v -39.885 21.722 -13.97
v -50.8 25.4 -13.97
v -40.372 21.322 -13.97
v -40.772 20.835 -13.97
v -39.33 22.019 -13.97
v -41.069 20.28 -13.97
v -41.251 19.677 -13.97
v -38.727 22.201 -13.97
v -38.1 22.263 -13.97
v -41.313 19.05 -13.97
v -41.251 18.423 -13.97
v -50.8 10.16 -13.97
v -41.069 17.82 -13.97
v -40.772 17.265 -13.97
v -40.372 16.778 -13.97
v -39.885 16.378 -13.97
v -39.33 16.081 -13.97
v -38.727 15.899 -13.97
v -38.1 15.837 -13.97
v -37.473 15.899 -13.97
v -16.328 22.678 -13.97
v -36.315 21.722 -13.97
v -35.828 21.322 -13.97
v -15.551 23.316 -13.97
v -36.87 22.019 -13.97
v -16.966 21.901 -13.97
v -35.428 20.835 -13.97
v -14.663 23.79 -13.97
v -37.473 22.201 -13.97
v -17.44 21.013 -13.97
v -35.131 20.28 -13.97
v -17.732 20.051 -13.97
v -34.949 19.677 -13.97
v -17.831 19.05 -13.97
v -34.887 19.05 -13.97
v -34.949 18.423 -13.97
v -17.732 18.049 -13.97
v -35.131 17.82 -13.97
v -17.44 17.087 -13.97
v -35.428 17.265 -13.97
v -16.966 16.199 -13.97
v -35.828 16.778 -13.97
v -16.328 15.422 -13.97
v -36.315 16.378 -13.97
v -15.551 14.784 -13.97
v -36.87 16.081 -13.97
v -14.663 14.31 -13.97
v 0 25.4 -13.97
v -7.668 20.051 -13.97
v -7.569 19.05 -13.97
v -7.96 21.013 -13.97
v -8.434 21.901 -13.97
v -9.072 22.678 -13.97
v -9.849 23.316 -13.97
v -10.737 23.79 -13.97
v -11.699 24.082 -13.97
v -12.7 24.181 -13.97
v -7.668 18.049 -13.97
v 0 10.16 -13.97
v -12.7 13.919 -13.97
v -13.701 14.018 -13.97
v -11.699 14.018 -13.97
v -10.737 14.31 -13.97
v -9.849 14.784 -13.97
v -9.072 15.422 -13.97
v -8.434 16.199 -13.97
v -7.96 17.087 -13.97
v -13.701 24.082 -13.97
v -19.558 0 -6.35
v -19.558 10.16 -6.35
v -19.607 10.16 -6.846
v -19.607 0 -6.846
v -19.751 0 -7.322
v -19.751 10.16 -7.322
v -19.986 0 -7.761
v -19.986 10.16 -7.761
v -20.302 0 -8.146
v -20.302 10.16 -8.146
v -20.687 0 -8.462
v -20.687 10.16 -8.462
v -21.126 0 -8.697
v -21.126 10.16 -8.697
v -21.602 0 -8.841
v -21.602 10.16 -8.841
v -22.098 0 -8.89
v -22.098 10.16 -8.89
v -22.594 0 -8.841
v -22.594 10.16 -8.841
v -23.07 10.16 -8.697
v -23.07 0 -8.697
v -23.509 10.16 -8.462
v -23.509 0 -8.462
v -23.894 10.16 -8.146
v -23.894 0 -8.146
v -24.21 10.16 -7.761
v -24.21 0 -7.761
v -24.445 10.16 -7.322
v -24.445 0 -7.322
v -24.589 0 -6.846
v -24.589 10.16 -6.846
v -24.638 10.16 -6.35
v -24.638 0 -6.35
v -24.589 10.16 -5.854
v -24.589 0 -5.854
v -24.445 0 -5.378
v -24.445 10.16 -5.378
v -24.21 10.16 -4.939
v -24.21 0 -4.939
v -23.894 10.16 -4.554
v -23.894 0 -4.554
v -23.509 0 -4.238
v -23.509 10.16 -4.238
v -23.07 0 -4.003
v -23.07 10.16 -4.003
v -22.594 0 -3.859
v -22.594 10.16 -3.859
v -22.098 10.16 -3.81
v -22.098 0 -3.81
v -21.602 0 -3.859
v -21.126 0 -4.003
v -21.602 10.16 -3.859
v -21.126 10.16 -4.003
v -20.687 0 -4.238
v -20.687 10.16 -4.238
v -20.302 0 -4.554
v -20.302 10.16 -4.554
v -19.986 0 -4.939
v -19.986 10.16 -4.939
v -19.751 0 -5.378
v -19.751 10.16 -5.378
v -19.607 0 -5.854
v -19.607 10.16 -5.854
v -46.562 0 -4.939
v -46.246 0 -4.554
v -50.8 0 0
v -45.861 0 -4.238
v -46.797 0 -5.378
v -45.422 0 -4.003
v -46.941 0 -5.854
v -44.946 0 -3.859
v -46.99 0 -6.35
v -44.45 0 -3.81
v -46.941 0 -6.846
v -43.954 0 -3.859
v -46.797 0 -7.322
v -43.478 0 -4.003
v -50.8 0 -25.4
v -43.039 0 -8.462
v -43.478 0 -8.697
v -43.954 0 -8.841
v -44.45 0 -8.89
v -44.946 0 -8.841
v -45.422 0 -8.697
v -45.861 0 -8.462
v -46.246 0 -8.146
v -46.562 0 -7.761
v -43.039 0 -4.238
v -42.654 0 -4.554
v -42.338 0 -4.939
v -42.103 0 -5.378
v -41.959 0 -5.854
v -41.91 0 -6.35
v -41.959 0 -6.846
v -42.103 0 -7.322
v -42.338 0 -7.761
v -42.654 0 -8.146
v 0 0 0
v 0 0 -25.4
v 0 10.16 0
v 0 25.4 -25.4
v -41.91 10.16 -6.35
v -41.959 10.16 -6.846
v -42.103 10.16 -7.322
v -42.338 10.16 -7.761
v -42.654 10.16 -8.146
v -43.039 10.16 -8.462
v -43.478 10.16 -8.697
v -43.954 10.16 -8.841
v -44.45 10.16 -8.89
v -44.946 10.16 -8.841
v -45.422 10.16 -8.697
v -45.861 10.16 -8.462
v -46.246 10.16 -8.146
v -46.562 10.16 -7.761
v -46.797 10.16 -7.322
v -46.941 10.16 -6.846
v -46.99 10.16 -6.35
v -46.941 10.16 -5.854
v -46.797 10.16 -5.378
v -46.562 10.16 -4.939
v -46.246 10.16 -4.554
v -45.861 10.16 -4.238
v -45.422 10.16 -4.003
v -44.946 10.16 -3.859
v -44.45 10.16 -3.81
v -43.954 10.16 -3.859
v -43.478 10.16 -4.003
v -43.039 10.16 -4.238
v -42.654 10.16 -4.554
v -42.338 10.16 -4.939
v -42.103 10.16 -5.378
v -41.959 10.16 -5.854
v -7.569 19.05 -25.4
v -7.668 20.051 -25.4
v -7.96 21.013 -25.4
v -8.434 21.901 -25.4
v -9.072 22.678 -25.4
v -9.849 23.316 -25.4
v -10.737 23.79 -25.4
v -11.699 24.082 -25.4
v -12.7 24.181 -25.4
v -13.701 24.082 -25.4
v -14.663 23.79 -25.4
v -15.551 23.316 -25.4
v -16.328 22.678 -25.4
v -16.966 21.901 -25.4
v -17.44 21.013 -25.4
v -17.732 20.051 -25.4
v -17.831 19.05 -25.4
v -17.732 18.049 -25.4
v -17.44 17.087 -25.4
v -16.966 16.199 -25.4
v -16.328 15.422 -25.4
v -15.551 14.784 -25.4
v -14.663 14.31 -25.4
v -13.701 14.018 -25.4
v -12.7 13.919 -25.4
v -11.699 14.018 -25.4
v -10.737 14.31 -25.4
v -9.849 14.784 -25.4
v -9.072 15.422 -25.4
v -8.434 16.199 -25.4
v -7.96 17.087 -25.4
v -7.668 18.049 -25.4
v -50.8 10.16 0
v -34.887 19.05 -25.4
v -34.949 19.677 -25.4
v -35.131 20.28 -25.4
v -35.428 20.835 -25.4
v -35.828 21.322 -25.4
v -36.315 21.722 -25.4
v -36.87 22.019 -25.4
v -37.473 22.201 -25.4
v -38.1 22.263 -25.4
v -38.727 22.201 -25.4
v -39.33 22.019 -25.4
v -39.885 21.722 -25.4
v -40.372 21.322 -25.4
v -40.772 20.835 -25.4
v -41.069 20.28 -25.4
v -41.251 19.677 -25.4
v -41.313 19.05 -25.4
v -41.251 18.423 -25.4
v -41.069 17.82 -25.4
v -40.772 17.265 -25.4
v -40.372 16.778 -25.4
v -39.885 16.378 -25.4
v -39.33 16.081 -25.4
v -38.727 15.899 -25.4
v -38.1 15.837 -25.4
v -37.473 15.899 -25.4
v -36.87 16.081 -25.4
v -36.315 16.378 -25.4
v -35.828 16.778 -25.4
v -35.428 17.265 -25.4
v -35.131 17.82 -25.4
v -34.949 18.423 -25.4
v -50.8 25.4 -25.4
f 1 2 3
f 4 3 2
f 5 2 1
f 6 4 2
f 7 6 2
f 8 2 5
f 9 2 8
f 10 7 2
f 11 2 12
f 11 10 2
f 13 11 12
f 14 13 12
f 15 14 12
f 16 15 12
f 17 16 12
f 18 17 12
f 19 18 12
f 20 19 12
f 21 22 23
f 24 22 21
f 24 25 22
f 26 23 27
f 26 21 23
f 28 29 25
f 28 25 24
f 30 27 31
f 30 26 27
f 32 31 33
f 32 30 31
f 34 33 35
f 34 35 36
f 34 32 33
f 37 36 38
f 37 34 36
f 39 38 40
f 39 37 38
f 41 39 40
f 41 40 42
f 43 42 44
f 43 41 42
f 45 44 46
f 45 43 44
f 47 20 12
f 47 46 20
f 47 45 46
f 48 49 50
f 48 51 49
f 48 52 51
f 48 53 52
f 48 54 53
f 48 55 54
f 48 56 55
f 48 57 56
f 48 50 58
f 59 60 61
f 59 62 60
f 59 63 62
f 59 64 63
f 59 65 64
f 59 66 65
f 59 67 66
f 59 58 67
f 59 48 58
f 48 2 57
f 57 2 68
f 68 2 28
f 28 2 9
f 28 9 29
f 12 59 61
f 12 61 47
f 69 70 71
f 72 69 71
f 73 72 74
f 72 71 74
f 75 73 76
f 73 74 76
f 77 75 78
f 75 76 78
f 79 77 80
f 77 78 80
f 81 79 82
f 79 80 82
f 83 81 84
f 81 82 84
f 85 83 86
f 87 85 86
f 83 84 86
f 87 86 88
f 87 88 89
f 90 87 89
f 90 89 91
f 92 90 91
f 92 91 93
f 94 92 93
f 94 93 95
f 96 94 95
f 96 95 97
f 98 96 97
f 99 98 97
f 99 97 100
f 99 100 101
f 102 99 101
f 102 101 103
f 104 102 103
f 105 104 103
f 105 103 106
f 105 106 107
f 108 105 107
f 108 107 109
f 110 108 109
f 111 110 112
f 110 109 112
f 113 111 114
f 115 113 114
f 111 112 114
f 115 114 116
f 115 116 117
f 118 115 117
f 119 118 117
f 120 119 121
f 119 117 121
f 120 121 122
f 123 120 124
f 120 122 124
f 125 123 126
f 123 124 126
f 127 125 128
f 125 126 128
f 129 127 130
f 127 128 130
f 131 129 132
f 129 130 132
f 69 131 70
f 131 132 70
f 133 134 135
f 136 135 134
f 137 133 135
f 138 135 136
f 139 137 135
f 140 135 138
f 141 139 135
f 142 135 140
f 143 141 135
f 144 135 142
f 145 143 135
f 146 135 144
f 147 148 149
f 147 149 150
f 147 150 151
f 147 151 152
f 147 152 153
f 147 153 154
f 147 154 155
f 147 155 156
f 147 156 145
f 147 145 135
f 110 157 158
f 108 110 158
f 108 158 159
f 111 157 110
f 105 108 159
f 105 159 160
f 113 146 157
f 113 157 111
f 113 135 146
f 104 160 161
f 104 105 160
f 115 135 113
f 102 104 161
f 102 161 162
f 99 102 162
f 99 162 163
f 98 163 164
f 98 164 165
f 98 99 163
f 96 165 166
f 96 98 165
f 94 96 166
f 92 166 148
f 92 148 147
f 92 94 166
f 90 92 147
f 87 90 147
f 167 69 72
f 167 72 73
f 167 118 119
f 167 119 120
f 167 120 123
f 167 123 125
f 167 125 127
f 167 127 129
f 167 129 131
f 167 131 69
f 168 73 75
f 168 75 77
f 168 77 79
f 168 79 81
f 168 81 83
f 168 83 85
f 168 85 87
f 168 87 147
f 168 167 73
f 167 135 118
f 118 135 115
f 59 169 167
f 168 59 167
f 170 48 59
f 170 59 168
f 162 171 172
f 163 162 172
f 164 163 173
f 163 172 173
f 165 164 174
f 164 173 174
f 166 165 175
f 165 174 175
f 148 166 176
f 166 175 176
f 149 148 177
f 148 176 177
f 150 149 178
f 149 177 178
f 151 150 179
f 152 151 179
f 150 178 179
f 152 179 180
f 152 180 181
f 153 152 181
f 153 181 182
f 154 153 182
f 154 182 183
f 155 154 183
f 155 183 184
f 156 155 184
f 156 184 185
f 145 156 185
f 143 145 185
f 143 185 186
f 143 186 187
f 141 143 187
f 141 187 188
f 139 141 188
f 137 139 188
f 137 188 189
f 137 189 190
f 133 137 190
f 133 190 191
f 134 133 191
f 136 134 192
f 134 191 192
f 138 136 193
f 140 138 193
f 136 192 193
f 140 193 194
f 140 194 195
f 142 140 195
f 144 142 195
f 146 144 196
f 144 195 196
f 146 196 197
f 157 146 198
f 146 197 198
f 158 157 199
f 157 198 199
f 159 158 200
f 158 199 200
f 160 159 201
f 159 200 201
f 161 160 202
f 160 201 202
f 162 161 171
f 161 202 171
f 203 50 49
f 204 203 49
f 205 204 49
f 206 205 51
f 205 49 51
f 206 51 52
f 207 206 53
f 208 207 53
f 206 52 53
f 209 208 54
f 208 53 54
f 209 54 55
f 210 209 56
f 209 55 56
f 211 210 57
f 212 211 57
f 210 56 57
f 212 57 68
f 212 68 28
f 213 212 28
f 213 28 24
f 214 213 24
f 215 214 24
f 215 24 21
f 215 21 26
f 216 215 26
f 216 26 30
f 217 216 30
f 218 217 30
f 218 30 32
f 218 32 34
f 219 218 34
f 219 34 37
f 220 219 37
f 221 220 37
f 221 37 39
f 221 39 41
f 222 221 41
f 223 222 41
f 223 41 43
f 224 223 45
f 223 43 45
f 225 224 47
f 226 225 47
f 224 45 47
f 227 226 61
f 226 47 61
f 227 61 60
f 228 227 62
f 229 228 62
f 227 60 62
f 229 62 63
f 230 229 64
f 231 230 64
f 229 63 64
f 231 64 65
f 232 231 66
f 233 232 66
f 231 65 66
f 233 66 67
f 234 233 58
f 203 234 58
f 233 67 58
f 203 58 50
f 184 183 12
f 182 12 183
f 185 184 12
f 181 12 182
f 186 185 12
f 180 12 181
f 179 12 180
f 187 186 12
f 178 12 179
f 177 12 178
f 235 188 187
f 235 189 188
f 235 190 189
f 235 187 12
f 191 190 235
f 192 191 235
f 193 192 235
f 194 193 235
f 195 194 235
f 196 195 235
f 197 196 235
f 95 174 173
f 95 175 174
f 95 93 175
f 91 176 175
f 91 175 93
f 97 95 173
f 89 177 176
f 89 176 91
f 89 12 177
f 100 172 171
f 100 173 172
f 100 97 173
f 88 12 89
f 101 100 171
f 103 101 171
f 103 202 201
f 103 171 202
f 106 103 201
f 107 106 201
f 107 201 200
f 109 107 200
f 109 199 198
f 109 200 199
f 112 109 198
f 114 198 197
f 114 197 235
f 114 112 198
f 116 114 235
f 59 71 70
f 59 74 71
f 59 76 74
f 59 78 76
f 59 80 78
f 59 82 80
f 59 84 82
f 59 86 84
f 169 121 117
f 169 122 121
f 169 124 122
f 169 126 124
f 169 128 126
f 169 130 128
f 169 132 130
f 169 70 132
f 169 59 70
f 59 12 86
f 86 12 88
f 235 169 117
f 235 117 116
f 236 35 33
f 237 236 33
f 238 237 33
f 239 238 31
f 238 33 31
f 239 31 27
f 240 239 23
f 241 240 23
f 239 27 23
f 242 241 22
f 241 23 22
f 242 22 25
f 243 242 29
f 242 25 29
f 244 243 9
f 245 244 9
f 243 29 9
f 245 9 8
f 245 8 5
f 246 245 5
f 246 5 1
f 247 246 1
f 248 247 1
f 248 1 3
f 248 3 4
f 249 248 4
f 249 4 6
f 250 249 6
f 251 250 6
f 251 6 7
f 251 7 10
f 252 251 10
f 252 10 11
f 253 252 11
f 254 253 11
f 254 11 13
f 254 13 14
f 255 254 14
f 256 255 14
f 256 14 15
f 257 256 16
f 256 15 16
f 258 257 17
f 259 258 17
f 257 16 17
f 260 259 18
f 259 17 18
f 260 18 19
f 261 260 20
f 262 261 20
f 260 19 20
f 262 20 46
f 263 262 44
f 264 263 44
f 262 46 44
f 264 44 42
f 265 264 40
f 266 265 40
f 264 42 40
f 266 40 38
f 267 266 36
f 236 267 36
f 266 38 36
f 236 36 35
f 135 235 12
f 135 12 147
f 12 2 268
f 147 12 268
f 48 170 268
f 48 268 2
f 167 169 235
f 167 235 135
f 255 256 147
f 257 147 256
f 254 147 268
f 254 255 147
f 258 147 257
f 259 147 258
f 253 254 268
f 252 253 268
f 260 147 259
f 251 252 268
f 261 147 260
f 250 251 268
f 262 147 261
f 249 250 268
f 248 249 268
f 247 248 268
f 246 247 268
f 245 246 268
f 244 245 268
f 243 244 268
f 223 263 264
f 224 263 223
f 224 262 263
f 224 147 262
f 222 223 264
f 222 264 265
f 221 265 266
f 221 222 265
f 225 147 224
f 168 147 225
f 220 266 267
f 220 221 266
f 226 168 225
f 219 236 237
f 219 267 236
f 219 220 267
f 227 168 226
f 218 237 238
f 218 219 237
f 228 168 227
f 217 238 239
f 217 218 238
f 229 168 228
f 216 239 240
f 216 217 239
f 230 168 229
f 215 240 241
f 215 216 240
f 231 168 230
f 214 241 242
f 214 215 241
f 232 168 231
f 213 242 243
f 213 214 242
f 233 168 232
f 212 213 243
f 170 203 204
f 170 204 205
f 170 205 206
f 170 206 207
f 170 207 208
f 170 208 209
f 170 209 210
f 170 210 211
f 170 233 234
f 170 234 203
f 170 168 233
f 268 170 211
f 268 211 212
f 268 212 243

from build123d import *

# Parameters (mm, degrees)
BOSS_EXTRUDE1_DEPTH = 50.8
SKETCH4_R           = 2.54
CUT_EXTRUDE1_DEPTH  = 11.16
SKETCH5_R           = 3.2131
SKETCH5_R_2         = 5.1308
CUT_EXTRUDE2_DEPTH  = 50.8


with BuildPart() as part:
    # Sketch3 → Boss-Extrude1 (new body)
    with BuildSketch(Plane(origin=(0, 0, 0), x_dir=(0, 0, -1), z_dir=(1, 0, 0))):
        Polygon((0, 0), (25.4, 0), (25.4, 25.4), (13.97, 25.4), (13.97, 10.16), (0, 10.16), align=None)
    extrude(amount=-BOSS_EXTRUDE1_DEPTH)

    # Sketch4 → Cut-Extrude1 (cut, through all)
    with BuildSketch(Plane(origin=(0, 10.16, 0), x_dir=(1, 0, 0), z_dir=(0, 1, 0))):
        with Locations((-44.45, 6.35)):
            Circle(SKETCH4_R)
        with Locations((-22.098, 6.35)):
            Circle(SKETCH4_R)
    extrude(amount=-CUT_EXTRUDE1_DEPTH, mode=Mode.SUBTRACT)

    # Sketch5 → Cut-Extrude2 (cut)
    with BuildSketch(Plane.XY.offset(-13.97)):
        with Locations((-38.1, 19.05)):
            Circle(SKETCH5_R)
        with Locations((-12.7, 19.05)):
            Circle(SKETCH5_R_2)
    extrude(amount=-CUT_EXTRUDE2_DEPTH, mode=Mode.SUBTRACT)


solid = part.part
